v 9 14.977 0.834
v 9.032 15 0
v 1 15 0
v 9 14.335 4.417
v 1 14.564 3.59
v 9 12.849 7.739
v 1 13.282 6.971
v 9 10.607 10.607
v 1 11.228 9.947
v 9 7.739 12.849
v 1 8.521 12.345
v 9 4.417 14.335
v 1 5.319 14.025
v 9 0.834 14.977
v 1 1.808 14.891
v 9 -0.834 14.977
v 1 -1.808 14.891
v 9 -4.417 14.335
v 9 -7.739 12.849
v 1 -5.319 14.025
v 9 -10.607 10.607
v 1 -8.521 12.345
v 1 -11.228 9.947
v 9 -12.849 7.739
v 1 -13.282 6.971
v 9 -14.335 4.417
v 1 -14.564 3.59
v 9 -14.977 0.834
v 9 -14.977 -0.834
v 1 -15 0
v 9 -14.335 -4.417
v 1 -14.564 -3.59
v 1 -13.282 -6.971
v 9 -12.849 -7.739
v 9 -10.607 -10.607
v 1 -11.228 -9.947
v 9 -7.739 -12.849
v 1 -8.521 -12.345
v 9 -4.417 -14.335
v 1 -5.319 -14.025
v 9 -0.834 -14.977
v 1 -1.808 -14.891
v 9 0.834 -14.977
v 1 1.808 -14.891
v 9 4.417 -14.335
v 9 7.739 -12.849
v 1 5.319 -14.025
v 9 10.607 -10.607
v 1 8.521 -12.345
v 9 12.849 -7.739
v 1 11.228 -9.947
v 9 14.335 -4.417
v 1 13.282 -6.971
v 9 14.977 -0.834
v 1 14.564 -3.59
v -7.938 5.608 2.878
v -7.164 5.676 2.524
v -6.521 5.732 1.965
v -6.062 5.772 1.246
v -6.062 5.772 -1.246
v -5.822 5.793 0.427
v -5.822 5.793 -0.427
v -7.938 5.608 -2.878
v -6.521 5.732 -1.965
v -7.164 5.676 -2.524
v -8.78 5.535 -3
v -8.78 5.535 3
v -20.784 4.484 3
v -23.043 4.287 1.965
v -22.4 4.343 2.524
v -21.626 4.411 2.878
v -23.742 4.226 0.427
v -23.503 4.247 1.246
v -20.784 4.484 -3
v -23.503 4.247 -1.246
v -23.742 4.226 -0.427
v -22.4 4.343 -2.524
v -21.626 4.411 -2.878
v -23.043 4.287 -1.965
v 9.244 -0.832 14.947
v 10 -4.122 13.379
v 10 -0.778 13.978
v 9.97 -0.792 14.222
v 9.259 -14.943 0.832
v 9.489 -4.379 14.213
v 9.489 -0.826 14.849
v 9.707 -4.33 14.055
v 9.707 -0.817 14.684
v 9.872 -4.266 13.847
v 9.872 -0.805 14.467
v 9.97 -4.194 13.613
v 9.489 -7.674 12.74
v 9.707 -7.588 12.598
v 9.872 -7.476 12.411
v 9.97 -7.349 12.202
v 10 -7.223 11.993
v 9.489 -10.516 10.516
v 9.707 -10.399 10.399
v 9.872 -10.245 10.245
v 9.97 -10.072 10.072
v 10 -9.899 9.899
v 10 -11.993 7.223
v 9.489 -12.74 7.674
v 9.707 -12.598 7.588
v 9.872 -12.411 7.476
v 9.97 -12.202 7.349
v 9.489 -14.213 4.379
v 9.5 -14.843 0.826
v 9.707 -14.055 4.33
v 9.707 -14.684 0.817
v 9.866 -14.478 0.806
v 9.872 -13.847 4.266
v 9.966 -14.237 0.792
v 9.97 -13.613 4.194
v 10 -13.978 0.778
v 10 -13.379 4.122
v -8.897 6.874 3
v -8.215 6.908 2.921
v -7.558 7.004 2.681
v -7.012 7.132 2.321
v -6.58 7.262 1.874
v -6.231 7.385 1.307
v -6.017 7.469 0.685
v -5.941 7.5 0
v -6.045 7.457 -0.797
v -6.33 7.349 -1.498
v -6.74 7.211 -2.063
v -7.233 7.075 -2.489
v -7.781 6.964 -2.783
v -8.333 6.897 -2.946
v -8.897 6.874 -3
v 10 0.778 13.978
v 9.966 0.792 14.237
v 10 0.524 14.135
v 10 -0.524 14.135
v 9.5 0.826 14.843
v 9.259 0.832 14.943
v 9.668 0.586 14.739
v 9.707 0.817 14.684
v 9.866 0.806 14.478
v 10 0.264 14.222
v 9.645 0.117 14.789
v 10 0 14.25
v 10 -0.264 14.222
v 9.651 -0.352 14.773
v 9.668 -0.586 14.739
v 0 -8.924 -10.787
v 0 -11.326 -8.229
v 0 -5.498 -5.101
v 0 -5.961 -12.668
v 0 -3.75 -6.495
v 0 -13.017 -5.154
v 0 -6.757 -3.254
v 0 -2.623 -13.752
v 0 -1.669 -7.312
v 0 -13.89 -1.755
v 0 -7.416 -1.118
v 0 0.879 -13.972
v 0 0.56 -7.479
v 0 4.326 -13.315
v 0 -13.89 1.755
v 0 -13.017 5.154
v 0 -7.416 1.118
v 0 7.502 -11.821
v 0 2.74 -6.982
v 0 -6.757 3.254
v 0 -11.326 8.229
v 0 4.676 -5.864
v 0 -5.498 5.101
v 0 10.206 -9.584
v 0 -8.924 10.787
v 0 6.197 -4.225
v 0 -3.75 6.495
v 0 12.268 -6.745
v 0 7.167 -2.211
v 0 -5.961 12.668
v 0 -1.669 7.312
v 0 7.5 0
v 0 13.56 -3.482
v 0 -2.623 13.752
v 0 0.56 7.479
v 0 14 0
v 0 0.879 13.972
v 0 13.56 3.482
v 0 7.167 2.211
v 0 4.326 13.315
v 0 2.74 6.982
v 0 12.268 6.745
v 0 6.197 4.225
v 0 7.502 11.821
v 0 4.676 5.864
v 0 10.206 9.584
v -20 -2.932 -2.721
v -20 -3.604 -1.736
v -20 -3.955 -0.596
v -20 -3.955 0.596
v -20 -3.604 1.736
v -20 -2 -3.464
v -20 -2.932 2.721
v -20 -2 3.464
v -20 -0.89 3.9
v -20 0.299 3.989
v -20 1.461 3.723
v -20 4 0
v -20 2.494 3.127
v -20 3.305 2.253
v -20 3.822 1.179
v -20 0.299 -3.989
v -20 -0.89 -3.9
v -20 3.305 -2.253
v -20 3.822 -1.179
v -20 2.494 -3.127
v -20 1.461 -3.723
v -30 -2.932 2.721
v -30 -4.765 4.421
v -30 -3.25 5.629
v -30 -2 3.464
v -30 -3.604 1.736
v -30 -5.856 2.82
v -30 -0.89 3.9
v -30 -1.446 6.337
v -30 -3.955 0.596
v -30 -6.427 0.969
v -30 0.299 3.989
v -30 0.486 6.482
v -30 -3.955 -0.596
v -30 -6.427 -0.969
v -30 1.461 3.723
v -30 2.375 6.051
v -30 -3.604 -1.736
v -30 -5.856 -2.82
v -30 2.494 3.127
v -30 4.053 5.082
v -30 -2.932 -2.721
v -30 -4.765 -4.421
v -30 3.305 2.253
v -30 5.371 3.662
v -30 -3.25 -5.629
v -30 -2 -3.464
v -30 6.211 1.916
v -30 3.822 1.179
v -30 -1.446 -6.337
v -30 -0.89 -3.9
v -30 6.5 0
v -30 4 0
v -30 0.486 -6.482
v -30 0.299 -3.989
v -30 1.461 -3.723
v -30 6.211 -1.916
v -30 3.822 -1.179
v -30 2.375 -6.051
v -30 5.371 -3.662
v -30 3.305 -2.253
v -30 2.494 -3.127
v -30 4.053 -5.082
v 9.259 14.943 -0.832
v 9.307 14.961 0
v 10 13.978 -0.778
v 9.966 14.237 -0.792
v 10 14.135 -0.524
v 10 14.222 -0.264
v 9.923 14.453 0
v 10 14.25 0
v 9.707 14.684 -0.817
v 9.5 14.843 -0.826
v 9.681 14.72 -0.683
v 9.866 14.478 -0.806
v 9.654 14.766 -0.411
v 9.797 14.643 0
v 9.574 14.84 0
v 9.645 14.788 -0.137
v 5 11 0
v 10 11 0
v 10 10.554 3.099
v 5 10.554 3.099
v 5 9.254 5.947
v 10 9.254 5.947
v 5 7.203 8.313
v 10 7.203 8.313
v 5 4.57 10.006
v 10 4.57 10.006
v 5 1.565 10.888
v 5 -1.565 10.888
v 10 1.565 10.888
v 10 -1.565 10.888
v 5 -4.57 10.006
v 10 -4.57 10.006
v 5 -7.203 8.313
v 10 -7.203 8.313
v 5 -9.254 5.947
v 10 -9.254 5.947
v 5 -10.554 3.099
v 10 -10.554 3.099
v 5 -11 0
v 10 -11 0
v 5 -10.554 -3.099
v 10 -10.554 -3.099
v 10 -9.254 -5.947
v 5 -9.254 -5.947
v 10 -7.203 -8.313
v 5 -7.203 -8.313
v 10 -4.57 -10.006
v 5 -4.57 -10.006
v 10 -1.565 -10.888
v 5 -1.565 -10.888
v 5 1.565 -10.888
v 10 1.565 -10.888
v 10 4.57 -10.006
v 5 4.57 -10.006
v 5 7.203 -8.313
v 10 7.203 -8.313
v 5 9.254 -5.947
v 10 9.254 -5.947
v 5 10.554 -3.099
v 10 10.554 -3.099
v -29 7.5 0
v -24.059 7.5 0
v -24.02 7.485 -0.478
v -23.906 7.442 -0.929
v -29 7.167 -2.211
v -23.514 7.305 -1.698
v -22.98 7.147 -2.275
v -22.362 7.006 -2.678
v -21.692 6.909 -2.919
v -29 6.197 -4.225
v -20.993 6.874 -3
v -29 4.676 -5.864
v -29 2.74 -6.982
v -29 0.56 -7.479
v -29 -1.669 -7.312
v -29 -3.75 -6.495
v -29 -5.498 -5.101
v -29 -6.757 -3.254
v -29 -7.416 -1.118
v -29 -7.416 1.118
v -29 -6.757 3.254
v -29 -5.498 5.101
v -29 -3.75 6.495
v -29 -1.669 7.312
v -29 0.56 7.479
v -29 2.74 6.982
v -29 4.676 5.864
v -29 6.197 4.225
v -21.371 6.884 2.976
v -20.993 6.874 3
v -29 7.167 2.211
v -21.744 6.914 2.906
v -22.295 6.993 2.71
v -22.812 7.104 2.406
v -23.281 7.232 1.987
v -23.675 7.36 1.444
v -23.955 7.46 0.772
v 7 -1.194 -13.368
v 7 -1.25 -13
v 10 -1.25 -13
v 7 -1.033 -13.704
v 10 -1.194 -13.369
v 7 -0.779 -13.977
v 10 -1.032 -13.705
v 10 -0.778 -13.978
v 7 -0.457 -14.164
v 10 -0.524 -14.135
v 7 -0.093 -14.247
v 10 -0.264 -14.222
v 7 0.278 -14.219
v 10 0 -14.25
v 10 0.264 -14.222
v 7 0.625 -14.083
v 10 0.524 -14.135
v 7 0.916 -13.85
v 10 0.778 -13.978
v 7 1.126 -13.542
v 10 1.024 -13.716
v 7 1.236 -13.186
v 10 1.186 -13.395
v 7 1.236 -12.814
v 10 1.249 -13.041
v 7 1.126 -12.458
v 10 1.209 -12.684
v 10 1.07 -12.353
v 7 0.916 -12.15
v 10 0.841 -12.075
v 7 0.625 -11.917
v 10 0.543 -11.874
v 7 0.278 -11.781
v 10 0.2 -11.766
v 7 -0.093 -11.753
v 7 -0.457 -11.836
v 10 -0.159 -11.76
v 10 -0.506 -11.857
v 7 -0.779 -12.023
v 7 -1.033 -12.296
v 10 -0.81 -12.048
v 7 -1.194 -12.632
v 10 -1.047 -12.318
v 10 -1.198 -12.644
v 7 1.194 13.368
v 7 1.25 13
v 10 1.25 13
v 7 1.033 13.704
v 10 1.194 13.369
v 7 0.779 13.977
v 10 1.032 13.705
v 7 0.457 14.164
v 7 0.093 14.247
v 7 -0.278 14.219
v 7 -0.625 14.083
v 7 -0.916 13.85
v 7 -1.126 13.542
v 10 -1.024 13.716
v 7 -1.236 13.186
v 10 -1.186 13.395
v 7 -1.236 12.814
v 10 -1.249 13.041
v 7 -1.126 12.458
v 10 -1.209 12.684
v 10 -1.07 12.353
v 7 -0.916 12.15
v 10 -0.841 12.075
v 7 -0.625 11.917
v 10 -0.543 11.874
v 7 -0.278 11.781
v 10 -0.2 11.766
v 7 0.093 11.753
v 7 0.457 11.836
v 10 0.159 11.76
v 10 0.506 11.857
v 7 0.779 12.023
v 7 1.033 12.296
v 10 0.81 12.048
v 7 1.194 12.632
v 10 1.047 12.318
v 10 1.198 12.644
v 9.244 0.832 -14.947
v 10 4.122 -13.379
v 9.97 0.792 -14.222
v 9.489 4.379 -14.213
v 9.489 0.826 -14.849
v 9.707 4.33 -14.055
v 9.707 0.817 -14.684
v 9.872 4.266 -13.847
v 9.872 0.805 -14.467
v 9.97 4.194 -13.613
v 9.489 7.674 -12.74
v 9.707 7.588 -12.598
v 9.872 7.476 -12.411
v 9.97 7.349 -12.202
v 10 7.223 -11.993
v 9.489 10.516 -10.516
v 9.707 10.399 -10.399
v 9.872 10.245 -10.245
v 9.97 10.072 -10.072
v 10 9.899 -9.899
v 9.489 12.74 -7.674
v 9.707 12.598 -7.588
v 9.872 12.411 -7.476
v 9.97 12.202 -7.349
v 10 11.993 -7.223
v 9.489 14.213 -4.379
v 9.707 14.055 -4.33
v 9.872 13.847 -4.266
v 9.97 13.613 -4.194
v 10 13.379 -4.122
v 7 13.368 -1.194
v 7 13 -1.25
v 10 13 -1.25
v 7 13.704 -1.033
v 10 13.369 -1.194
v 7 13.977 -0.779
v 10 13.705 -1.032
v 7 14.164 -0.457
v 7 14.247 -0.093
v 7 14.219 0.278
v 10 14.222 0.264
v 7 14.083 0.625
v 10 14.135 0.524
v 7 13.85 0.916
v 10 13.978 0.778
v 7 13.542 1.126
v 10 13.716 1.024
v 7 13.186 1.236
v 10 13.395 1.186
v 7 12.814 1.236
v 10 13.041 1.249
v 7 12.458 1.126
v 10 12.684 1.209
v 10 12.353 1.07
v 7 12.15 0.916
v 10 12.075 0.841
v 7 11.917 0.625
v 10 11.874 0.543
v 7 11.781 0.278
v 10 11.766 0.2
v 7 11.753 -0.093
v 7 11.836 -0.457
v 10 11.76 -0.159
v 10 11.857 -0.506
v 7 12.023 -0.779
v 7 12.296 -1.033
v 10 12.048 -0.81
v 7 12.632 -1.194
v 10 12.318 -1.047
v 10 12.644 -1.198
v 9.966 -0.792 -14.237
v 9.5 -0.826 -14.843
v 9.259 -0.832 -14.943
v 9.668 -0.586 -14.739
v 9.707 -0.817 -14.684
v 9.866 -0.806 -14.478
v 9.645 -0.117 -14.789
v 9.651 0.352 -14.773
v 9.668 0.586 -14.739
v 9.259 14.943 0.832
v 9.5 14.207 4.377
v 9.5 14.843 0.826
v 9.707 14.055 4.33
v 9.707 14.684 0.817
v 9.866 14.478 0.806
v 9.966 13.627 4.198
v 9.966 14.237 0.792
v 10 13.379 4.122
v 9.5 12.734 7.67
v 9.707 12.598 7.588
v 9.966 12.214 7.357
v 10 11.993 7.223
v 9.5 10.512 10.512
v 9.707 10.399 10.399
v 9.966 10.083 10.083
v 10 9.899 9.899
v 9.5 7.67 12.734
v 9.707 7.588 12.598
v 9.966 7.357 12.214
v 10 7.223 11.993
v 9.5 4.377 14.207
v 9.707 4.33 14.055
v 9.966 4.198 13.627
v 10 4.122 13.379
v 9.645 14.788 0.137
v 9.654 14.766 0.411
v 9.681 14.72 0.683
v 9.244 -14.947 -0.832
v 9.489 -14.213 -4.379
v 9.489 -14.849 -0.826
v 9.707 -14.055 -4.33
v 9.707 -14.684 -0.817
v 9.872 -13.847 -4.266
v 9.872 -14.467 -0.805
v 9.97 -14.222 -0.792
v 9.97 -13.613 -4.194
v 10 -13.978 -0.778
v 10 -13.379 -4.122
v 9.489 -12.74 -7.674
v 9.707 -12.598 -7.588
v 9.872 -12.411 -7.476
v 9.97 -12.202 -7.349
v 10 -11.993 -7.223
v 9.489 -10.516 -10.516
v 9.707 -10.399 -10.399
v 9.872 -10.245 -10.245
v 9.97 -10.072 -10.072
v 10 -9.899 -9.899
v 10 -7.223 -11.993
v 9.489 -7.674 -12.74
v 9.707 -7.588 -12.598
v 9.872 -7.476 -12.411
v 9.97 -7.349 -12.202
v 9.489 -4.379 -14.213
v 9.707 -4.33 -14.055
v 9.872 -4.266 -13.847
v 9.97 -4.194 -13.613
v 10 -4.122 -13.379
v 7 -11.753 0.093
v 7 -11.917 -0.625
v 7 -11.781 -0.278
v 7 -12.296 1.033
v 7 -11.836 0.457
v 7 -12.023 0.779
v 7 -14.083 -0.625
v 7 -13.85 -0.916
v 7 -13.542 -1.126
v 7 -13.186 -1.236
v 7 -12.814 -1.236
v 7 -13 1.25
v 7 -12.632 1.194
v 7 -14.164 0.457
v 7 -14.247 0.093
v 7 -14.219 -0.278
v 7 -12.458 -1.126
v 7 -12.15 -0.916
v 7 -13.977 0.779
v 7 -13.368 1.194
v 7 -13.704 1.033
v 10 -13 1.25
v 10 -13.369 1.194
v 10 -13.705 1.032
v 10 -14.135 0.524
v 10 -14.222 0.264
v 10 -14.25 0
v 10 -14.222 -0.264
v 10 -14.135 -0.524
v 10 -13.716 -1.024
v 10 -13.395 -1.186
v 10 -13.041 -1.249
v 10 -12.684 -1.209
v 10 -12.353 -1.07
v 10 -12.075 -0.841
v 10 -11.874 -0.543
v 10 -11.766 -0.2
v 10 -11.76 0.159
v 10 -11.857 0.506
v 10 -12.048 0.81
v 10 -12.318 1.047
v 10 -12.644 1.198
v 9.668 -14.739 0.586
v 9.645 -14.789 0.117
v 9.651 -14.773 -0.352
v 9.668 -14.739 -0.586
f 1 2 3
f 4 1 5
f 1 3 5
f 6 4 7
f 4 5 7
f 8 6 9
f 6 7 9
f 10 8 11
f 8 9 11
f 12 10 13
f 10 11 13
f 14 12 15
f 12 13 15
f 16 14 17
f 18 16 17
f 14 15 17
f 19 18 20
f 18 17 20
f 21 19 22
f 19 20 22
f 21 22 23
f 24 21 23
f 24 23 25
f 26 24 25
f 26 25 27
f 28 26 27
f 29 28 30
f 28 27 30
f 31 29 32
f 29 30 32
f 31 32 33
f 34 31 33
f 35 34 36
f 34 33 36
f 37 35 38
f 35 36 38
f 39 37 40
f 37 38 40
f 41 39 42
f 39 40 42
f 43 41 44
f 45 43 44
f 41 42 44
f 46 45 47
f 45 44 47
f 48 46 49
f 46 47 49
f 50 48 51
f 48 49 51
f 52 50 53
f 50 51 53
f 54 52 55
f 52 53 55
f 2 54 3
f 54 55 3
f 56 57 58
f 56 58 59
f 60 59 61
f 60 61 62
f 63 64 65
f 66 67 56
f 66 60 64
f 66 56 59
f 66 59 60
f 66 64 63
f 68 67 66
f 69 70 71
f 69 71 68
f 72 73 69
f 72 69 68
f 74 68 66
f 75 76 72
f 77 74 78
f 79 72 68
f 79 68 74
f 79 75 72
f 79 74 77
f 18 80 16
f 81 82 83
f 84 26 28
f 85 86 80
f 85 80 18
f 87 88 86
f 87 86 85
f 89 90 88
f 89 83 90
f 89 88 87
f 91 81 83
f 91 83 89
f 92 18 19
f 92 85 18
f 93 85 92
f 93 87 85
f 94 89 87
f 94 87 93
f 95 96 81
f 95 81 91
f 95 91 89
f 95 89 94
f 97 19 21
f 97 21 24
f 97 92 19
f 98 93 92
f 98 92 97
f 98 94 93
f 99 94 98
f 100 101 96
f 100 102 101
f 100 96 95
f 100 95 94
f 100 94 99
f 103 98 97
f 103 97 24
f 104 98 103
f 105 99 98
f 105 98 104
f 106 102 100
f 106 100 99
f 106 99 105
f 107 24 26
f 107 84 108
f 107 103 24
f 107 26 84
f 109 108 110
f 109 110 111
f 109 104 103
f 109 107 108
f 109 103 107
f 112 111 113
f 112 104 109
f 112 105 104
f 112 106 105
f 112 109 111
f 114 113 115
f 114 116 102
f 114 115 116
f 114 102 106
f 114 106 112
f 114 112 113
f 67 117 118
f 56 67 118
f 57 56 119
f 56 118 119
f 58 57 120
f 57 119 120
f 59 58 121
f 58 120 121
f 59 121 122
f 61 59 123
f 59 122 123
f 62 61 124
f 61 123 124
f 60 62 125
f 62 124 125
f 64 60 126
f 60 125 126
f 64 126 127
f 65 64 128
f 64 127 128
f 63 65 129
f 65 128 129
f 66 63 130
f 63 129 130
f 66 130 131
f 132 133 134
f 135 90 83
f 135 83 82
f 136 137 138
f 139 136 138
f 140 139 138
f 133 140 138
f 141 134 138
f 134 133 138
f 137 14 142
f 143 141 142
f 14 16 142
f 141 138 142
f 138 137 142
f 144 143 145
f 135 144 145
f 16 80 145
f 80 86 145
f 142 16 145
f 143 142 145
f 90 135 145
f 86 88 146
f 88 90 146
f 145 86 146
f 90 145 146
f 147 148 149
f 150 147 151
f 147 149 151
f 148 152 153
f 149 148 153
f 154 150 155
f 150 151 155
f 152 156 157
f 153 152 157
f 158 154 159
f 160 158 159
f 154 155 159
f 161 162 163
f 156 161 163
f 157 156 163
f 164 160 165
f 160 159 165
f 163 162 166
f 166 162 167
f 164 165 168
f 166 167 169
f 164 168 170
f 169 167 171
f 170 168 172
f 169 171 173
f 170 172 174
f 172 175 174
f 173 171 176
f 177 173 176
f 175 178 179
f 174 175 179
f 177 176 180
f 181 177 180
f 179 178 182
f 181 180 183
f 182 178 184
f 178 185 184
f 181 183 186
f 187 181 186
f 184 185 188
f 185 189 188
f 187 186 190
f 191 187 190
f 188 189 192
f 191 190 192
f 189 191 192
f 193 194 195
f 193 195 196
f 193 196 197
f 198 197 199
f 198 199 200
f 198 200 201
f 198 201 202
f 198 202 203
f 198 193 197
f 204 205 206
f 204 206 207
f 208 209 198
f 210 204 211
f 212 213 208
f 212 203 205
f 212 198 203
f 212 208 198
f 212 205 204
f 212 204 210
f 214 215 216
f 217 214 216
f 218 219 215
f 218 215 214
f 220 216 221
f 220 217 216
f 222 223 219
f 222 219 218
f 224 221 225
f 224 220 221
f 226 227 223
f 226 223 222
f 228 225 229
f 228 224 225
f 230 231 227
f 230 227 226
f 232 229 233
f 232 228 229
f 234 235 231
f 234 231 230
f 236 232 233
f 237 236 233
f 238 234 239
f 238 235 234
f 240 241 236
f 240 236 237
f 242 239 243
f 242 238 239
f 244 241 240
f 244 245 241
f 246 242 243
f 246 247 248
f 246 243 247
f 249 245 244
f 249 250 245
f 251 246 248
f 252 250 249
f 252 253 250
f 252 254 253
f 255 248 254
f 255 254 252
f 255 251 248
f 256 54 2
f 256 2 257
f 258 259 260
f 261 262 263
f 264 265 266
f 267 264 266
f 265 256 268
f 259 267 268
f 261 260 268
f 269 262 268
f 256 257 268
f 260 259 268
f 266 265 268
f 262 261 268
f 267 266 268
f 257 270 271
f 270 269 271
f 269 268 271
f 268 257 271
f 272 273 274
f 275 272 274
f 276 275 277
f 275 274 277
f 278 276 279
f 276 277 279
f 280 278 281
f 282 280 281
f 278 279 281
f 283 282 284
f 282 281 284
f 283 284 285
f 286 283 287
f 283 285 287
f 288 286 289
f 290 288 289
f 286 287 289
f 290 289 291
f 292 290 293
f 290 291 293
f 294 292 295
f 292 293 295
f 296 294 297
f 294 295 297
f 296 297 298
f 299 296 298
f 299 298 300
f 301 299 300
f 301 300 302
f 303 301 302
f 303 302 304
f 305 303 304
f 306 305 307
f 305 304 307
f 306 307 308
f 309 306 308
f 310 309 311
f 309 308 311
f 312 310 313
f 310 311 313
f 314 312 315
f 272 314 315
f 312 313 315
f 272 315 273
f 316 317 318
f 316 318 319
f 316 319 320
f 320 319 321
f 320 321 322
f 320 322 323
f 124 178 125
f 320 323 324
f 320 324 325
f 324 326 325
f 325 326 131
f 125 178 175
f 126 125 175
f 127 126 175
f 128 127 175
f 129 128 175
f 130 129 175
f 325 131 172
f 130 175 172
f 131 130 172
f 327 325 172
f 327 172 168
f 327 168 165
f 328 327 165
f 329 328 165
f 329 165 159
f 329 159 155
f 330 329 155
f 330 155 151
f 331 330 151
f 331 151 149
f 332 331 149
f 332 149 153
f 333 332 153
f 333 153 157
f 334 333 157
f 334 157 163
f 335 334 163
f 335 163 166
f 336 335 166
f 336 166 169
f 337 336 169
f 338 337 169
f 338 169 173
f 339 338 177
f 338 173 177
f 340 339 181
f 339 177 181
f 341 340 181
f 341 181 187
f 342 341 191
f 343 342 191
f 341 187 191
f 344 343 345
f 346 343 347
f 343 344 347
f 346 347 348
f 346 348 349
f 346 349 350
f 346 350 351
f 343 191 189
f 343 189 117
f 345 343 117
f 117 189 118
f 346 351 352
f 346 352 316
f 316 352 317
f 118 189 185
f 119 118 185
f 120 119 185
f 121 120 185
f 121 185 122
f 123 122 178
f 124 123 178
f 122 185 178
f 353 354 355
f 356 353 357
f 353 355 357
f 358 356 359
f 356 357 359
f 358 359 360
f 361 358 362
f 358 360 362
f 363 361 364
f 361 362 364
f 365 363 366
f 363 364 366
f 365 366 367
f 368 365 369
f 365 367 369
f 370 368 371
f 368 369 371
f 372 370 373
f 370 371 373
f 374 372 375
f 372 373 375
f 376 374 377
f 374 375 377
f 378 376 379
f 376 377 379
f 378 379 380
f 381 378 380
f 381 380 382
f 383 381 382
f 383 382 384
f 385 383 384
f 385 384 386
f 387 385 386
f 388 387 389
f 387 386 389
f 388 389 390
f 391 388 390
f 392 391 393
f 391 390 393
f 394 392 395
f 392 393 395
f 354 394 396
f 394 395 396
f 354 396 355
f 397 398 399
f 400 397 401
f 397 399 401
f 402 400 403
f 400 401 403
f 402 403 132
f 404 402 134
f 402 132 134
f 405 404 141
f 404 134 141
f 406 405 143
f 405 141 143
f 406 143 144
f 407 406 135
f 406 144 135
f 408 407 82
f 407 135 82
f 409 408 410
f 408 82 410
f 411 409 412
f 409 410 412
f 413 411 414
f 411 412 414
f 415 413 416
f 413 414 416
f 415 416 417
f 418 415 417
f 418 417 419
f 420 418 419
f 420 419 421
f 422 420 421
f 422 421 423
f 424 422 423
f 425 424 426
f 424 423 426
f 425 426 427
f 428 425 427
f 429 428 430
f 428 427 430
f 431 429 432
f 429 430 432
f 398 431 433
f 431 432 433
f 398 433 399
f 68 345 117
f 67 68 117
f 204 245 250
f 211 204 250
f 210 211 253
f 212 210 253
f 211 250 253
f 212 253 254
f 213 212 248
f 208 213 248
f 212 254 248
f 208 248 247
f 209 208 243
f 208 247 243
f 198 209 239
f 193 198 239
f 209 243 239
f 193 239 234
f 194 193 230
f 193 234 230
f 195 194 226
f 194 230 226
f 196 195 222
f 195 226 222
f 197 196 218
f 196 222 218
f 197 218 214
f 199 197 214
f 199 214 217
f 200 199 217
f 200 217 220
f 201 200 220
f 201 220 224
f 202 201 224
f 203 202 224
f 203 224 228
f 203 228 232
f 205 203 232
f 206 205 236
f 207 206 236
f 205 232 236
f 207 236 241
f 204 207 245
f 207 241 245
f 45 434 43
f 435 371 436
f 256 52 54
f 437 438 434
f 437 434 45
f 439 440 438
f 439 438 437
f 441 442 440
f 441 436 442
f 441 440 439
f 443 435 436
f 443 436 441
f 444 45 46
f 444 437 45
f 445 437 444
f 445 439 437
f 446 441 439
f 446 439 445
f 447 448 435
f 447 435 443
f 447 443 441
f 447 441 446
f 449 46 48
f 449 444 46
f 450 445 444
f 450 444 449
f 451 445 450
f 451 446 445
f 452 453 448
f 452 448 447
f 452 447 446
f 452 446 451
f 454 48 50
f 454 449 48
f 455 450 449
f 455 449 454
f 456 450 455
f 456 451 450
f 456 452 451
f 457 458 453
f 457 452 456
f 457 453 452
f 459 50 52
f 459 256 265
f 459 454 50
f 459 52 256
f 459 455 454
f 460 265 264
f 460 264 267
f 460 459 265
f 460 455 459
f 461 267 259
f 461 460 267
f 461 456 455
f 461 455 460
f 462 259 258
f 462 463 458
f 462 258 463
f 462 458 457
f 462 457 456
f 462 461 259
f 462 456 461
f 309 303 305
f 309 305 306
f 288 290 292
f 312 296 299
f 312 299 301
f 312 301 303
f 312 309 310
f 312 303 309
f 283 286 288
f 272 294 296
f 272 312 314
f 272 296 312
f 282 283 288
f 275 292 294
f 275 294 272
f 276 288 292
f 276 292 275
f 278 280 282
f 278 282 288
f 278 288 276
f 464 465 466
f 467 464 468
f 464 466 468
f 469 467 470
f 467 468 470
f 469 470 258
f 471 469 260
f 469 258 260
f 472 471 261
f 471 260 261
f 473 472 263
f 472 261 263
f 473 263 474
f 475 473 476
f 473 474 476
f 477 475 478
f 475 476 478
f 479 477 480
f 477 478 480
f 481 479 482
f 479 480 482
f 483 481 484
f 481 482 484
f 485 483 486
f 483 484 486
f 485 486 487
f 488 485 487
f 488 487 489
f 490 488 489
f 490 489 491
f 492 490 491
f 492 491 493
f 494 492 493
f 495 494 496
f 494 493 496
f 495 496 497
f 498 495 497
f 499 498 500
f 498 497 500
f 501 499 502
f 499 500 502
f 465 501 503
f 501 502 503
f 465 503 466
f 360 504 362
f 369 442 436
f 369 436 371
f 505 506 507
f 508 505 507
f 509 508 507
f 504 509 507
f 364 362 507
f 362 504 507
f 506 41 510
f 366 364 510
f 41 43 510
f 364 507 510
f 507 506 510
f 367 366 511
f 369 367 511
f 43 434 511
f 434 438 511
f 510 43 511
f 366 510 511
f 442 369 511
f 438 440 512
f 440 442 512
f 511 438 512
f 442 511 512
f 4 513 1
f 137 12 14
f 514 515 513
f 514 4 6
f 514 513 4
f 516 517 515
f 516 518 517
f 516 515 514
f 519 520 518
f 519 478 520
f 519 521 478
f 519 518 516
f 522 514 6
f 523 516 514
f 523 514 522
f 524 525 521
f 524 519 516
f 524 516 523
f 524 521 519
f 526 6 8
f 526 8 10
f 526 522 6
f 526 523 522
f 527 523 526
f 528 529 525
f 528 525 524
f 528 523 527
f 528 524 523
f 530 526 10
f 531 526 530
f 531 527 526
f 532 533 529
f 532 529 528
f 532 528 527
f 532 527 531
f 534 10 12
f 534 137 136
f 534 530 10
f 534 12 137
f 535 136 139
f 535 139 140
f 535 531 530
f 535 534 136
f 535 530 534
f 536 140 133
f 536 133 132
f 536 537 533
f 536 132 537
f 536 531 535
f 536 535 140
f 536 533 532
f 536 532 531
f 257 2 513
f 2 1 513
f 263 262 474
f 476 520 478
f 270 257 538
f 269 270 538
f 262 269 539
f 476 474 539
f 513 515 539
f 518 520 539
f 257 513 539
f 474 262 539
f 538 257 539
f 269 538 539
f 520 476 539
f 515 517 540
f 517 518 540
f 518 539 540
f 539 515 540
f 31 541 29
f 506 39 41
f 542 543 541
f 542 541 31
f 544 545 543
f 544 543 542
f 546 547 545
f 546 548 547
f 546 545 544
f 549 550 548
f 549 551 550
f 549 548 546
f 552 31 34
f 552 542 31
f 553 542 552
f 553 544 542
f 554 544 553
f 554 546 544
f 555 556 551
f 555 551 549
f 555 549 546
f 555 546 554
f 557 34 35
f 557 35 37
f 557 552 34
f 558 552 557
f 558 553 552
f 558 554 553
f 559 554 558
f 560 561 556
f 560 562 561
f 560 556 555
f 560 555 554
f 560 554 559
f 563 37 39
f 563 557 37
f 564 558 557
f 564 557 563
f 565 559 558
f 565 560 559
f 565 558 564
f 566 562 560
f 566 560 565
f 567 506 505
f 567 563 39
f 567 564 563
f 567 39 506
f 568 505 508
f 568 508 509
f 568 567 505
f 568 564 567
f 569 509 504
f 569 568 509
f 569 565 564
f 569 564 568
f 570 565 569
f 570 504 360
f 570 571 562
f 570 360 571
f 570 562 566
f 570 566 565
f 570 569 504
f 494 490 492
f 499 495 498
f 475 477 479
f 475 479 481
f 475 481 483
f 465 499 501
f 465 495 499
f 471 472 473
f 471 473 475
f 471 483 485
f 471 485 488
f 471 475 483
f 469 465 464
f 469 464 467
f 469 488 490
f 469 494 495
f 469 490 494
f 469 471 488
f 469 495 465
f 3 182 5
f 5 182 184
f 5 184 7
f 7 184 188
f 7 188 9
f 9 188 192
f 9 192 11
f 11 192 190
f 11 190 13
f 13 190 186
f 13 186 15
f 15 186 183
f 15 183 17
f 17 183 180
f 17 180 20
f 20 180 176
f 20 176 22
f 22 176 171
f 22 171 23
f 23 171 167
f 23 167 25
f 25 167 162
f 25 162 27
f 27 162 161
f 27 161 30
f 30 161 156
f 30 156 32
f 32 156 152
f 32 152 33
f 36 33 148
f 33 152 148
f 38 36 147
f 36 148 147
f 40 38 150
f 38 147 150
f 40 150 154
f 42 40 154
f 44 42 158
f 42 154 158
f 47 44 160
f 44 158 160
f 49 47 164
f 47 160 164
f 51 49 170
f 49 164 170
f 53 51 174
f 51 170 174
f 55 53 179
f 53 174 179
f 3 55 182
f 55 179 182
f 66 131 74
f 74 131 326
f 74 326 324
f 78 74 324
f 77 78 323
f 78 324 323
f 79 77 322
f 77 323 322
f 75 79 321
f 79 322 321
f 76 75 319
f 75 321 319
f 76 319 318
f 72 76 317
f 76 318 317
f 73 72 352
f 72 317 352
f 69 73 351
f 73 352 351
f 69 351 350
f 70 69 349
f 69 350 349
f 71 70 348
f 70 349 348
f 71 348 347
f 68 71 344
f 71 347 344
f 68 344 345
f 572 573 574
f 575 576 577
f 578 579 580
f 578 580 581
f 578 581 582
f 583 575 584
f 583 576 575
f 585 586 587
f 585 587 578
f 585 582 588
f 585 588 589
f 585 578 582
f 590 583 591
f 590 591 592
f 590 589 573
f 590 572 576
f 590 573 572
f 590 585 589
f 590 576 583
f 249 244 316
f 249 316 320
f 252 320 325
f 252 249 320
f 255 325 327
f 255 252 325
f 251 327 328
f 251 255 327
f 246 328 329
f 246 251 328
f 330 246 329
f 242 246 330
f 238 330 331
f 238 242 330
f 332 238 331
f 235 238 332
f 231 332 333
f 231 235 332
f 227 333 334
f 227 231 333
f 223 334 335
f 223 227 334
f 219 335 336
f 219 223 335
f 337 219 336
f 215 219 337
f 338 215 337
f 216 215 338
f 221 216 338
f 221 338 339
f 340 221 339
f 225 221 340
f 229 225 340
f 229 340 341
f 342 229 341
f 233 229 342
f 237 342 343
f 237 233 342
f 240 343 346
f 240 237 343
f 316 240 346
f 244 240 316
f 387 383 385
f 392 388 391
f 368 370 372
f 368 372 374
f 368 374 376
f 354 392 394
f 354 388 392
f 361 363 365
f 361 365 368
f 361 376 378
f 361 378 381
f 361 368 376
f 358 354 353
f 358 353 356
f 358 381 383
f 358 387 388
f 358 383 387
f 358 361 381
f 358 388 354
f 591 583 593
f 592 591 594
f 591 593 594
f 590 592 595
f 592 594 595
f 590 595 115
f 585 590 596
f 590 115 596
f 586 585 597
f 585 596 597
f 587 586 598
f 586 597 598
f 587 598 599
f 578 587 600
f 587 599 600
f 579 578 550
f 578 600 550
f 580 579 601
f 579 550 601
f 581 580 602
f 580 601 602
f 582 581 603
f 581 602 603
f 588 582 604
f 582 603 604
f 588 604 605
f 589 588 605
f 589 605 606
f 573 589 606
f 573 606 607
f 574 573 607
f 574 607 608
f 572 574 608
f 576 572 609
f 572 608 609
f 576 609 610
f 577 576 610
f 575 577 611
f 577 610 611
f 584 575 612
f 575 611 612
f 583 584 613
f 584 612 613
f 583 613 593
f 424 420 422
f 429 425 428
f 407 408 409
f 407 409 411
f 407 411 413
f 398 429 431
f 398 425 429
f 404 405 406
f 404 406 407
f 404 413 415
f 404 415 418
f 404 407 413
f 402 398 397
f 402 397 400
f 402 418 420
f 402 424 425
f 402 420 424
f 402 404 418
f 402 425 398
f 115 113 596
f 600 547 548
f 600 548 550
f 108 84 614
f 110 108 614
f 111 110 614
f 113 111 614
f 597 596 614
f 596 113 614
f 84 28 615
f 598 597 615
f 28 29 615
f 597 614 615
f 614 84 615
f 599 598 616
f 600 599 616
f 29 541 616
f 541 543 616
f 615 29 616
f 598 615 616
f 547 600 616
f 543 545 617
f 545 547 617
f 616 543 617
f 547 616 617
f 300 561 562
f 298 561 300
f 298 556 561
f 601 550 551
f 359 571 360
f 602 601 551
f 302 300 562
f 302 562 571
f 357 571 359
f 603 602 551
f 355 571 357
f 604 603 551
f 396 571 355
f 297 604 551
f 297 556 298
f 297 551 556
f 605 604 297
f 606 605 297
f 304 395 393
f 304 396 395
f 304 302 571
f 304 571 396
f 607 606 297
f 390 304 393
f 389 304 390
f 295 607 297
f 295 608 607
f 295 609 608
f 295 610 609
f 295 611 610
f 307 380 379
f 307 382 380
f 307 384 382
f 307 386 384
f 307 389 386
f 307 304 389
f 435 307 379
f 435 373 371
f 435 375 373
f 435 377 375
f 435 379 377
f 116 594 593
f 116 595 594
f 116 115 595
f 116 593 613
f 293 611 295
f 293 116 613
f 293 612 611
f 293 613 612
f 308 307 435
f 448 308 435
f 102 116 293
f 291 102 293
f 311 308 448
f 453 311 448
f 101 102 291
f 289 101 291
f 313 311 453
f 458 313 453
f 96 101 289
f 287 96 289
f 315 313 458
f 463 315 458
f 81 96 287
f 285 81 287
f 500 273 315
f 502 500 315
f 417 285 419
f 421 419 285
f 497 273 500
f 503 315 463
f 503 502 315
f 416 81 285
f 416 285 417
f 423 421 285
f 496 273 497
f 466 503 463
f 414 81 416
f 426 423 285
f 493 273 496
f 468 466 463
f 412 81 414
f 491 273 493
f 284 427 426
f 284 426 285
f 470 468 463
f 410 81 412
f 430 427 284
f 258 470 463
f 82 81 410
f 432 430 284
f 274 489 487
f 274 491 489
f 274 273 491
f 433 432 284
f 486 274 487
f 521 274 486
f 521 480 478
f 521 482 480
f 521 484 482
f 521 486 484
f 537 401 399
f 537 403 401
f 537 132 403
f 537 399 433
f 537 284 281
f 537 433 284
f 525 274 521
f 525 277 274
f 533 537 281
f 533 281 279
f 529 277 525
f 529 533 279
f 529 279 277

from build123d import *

# Parameters (mm, degrees)
SKETCH_R           = 15
PAD_DEPTH          = 10
SKETCH001_R        = 11
POCKET_DEPTH       = 5
SKETCH002_R        = 7.5
PAD001_DEPTH       = 30
SKETCH003_R        = 1.25
POCKET001_DEPTH    = 3
POLARPATTERN_COUNT = 4
SKETCH004_R        = 4
POCKET002_DEPTH    = 10
POCKET003_DEPTH    = 2.5
FILLET_R           = 1
CHAMFER_ANGLE      = 45
CHAMFER_SIZE       = 1
CHAMFER001_ANGLE   = 45
CHAMFER001_SIZE    = 1


with BuildPart() as part:
    # Sketch → Pad (new body)
    with BuildSketch(Plane.YZ):
        Circle(SKETCH_R)
    extrude(amount=PAD_DEPTH)

    # Sketch001 (on Face3 of Pad) → Pocket (cut)
    with BuildSketch(Plane.YZ.offset(10)):
        Circle(SKETCH001_R)
    extrude(amount=-POCKET_DEPTH, mode=Mode.SUBTRACT)

    # Sketch002 (on Face2 of Pocket) → Pad001 (join)
    with BuildSketch(Plane(origin=(0, 0, 0), x_dir=(0, 1, 0), z_dir=(-1, 0, 0))):
        Circle(SKETCH002_R)
    extrude(amount=PAD001_DEPTH)

    # Sketch003 (on Face3 of Pad001) → Pocket001 (cut)
    with BuildSketch(Plane.YZ.offset(10)):
        with Locations((0, 13)):
            Circle(SKETCH003_R)
    pocket001 = extrude(amount=-POCKET001_DEPTH, mode=Mode.SUBTRACT)

    # PolarPattern: Pocket001 ×4 about axis
    polarpattern_axis = Axis((10, 0, 0), (1, 0, 0))
    for i in range(1, POLARPATTERN_COUNT):
        add(pocket001.rotate(polarpattern_axis, i * 360 / POLARPATTERN_COUNT), mode=Mode.SUBTRACT)

    # Sketch004 (on Face10 of PolarPattern) → Pocket002 (cut)
    with BuildSketch(Plane(origin=(-30, 0, 0), x_dir=(0, 1, 0), z_dir=(-1, 0, 0))):
        Circle(SKETCH004_R)
    extrude(amount=-POCKET002_DEPTH, mode=Mode.SUBTRACT)

    # Sketch005 (on DatumPlane) → Pocket003 (cut, symmetric)
    with BuildSketch(Plane(origin=(-15, 7.5, 0), x_dir=(0, 0, -1), z_dir=(-0.087156, 0.996195, 0))):
        with BuildLine():
            ThreePointArc((3, 6.025), (0, 9.025), (-3, 6.025))
            Line((-3, 6.025), (-3, -6.025))
            ThreePointArc((-3, -6.025), (0, -9.025), (3, -6.025))
            Line((3, -6.025), (3, 6.025))
        make_face()
    extrude(amount=POCKET003_DEPTH, both=True, mode=Mode.SUBTRACT)

    # Fillet
    fillet_edges = [part.edges().sort_by_distance(p)[0] for p in [
        (10, -15, 0),
    ]]
    fillet(fillet_edges, radius=FILLET_R)

    # Chamfer
    chamfer_edges = [part.edges().sort_by_distance(p)[0] for p in [
        (0, -15, 0),
    ]]
    chamfer_side = part.faces().sort_by_distance((4.520615, -15, 0))[0]
    chamfer(chamfer_edges, length=CHAMFER_SIZE, angle=CHAMFER_ANGLE, reference=chamfer_side)

    # Chamfer001
    chamfer001_edges = [part.edges().sort_by_distance(p)[0] for p in [
        (-30, -7.5, 0),
    ]]
    chamfer001_side = part.faces().sort_by_distance((-15, -7.5, 0))[0]
    chamfer(chamfer001_edges, length=CHAMFER001_SIZE, angle=CHAMFER001_ANGLE, reference=chamfer001_side)


solid = part.part
